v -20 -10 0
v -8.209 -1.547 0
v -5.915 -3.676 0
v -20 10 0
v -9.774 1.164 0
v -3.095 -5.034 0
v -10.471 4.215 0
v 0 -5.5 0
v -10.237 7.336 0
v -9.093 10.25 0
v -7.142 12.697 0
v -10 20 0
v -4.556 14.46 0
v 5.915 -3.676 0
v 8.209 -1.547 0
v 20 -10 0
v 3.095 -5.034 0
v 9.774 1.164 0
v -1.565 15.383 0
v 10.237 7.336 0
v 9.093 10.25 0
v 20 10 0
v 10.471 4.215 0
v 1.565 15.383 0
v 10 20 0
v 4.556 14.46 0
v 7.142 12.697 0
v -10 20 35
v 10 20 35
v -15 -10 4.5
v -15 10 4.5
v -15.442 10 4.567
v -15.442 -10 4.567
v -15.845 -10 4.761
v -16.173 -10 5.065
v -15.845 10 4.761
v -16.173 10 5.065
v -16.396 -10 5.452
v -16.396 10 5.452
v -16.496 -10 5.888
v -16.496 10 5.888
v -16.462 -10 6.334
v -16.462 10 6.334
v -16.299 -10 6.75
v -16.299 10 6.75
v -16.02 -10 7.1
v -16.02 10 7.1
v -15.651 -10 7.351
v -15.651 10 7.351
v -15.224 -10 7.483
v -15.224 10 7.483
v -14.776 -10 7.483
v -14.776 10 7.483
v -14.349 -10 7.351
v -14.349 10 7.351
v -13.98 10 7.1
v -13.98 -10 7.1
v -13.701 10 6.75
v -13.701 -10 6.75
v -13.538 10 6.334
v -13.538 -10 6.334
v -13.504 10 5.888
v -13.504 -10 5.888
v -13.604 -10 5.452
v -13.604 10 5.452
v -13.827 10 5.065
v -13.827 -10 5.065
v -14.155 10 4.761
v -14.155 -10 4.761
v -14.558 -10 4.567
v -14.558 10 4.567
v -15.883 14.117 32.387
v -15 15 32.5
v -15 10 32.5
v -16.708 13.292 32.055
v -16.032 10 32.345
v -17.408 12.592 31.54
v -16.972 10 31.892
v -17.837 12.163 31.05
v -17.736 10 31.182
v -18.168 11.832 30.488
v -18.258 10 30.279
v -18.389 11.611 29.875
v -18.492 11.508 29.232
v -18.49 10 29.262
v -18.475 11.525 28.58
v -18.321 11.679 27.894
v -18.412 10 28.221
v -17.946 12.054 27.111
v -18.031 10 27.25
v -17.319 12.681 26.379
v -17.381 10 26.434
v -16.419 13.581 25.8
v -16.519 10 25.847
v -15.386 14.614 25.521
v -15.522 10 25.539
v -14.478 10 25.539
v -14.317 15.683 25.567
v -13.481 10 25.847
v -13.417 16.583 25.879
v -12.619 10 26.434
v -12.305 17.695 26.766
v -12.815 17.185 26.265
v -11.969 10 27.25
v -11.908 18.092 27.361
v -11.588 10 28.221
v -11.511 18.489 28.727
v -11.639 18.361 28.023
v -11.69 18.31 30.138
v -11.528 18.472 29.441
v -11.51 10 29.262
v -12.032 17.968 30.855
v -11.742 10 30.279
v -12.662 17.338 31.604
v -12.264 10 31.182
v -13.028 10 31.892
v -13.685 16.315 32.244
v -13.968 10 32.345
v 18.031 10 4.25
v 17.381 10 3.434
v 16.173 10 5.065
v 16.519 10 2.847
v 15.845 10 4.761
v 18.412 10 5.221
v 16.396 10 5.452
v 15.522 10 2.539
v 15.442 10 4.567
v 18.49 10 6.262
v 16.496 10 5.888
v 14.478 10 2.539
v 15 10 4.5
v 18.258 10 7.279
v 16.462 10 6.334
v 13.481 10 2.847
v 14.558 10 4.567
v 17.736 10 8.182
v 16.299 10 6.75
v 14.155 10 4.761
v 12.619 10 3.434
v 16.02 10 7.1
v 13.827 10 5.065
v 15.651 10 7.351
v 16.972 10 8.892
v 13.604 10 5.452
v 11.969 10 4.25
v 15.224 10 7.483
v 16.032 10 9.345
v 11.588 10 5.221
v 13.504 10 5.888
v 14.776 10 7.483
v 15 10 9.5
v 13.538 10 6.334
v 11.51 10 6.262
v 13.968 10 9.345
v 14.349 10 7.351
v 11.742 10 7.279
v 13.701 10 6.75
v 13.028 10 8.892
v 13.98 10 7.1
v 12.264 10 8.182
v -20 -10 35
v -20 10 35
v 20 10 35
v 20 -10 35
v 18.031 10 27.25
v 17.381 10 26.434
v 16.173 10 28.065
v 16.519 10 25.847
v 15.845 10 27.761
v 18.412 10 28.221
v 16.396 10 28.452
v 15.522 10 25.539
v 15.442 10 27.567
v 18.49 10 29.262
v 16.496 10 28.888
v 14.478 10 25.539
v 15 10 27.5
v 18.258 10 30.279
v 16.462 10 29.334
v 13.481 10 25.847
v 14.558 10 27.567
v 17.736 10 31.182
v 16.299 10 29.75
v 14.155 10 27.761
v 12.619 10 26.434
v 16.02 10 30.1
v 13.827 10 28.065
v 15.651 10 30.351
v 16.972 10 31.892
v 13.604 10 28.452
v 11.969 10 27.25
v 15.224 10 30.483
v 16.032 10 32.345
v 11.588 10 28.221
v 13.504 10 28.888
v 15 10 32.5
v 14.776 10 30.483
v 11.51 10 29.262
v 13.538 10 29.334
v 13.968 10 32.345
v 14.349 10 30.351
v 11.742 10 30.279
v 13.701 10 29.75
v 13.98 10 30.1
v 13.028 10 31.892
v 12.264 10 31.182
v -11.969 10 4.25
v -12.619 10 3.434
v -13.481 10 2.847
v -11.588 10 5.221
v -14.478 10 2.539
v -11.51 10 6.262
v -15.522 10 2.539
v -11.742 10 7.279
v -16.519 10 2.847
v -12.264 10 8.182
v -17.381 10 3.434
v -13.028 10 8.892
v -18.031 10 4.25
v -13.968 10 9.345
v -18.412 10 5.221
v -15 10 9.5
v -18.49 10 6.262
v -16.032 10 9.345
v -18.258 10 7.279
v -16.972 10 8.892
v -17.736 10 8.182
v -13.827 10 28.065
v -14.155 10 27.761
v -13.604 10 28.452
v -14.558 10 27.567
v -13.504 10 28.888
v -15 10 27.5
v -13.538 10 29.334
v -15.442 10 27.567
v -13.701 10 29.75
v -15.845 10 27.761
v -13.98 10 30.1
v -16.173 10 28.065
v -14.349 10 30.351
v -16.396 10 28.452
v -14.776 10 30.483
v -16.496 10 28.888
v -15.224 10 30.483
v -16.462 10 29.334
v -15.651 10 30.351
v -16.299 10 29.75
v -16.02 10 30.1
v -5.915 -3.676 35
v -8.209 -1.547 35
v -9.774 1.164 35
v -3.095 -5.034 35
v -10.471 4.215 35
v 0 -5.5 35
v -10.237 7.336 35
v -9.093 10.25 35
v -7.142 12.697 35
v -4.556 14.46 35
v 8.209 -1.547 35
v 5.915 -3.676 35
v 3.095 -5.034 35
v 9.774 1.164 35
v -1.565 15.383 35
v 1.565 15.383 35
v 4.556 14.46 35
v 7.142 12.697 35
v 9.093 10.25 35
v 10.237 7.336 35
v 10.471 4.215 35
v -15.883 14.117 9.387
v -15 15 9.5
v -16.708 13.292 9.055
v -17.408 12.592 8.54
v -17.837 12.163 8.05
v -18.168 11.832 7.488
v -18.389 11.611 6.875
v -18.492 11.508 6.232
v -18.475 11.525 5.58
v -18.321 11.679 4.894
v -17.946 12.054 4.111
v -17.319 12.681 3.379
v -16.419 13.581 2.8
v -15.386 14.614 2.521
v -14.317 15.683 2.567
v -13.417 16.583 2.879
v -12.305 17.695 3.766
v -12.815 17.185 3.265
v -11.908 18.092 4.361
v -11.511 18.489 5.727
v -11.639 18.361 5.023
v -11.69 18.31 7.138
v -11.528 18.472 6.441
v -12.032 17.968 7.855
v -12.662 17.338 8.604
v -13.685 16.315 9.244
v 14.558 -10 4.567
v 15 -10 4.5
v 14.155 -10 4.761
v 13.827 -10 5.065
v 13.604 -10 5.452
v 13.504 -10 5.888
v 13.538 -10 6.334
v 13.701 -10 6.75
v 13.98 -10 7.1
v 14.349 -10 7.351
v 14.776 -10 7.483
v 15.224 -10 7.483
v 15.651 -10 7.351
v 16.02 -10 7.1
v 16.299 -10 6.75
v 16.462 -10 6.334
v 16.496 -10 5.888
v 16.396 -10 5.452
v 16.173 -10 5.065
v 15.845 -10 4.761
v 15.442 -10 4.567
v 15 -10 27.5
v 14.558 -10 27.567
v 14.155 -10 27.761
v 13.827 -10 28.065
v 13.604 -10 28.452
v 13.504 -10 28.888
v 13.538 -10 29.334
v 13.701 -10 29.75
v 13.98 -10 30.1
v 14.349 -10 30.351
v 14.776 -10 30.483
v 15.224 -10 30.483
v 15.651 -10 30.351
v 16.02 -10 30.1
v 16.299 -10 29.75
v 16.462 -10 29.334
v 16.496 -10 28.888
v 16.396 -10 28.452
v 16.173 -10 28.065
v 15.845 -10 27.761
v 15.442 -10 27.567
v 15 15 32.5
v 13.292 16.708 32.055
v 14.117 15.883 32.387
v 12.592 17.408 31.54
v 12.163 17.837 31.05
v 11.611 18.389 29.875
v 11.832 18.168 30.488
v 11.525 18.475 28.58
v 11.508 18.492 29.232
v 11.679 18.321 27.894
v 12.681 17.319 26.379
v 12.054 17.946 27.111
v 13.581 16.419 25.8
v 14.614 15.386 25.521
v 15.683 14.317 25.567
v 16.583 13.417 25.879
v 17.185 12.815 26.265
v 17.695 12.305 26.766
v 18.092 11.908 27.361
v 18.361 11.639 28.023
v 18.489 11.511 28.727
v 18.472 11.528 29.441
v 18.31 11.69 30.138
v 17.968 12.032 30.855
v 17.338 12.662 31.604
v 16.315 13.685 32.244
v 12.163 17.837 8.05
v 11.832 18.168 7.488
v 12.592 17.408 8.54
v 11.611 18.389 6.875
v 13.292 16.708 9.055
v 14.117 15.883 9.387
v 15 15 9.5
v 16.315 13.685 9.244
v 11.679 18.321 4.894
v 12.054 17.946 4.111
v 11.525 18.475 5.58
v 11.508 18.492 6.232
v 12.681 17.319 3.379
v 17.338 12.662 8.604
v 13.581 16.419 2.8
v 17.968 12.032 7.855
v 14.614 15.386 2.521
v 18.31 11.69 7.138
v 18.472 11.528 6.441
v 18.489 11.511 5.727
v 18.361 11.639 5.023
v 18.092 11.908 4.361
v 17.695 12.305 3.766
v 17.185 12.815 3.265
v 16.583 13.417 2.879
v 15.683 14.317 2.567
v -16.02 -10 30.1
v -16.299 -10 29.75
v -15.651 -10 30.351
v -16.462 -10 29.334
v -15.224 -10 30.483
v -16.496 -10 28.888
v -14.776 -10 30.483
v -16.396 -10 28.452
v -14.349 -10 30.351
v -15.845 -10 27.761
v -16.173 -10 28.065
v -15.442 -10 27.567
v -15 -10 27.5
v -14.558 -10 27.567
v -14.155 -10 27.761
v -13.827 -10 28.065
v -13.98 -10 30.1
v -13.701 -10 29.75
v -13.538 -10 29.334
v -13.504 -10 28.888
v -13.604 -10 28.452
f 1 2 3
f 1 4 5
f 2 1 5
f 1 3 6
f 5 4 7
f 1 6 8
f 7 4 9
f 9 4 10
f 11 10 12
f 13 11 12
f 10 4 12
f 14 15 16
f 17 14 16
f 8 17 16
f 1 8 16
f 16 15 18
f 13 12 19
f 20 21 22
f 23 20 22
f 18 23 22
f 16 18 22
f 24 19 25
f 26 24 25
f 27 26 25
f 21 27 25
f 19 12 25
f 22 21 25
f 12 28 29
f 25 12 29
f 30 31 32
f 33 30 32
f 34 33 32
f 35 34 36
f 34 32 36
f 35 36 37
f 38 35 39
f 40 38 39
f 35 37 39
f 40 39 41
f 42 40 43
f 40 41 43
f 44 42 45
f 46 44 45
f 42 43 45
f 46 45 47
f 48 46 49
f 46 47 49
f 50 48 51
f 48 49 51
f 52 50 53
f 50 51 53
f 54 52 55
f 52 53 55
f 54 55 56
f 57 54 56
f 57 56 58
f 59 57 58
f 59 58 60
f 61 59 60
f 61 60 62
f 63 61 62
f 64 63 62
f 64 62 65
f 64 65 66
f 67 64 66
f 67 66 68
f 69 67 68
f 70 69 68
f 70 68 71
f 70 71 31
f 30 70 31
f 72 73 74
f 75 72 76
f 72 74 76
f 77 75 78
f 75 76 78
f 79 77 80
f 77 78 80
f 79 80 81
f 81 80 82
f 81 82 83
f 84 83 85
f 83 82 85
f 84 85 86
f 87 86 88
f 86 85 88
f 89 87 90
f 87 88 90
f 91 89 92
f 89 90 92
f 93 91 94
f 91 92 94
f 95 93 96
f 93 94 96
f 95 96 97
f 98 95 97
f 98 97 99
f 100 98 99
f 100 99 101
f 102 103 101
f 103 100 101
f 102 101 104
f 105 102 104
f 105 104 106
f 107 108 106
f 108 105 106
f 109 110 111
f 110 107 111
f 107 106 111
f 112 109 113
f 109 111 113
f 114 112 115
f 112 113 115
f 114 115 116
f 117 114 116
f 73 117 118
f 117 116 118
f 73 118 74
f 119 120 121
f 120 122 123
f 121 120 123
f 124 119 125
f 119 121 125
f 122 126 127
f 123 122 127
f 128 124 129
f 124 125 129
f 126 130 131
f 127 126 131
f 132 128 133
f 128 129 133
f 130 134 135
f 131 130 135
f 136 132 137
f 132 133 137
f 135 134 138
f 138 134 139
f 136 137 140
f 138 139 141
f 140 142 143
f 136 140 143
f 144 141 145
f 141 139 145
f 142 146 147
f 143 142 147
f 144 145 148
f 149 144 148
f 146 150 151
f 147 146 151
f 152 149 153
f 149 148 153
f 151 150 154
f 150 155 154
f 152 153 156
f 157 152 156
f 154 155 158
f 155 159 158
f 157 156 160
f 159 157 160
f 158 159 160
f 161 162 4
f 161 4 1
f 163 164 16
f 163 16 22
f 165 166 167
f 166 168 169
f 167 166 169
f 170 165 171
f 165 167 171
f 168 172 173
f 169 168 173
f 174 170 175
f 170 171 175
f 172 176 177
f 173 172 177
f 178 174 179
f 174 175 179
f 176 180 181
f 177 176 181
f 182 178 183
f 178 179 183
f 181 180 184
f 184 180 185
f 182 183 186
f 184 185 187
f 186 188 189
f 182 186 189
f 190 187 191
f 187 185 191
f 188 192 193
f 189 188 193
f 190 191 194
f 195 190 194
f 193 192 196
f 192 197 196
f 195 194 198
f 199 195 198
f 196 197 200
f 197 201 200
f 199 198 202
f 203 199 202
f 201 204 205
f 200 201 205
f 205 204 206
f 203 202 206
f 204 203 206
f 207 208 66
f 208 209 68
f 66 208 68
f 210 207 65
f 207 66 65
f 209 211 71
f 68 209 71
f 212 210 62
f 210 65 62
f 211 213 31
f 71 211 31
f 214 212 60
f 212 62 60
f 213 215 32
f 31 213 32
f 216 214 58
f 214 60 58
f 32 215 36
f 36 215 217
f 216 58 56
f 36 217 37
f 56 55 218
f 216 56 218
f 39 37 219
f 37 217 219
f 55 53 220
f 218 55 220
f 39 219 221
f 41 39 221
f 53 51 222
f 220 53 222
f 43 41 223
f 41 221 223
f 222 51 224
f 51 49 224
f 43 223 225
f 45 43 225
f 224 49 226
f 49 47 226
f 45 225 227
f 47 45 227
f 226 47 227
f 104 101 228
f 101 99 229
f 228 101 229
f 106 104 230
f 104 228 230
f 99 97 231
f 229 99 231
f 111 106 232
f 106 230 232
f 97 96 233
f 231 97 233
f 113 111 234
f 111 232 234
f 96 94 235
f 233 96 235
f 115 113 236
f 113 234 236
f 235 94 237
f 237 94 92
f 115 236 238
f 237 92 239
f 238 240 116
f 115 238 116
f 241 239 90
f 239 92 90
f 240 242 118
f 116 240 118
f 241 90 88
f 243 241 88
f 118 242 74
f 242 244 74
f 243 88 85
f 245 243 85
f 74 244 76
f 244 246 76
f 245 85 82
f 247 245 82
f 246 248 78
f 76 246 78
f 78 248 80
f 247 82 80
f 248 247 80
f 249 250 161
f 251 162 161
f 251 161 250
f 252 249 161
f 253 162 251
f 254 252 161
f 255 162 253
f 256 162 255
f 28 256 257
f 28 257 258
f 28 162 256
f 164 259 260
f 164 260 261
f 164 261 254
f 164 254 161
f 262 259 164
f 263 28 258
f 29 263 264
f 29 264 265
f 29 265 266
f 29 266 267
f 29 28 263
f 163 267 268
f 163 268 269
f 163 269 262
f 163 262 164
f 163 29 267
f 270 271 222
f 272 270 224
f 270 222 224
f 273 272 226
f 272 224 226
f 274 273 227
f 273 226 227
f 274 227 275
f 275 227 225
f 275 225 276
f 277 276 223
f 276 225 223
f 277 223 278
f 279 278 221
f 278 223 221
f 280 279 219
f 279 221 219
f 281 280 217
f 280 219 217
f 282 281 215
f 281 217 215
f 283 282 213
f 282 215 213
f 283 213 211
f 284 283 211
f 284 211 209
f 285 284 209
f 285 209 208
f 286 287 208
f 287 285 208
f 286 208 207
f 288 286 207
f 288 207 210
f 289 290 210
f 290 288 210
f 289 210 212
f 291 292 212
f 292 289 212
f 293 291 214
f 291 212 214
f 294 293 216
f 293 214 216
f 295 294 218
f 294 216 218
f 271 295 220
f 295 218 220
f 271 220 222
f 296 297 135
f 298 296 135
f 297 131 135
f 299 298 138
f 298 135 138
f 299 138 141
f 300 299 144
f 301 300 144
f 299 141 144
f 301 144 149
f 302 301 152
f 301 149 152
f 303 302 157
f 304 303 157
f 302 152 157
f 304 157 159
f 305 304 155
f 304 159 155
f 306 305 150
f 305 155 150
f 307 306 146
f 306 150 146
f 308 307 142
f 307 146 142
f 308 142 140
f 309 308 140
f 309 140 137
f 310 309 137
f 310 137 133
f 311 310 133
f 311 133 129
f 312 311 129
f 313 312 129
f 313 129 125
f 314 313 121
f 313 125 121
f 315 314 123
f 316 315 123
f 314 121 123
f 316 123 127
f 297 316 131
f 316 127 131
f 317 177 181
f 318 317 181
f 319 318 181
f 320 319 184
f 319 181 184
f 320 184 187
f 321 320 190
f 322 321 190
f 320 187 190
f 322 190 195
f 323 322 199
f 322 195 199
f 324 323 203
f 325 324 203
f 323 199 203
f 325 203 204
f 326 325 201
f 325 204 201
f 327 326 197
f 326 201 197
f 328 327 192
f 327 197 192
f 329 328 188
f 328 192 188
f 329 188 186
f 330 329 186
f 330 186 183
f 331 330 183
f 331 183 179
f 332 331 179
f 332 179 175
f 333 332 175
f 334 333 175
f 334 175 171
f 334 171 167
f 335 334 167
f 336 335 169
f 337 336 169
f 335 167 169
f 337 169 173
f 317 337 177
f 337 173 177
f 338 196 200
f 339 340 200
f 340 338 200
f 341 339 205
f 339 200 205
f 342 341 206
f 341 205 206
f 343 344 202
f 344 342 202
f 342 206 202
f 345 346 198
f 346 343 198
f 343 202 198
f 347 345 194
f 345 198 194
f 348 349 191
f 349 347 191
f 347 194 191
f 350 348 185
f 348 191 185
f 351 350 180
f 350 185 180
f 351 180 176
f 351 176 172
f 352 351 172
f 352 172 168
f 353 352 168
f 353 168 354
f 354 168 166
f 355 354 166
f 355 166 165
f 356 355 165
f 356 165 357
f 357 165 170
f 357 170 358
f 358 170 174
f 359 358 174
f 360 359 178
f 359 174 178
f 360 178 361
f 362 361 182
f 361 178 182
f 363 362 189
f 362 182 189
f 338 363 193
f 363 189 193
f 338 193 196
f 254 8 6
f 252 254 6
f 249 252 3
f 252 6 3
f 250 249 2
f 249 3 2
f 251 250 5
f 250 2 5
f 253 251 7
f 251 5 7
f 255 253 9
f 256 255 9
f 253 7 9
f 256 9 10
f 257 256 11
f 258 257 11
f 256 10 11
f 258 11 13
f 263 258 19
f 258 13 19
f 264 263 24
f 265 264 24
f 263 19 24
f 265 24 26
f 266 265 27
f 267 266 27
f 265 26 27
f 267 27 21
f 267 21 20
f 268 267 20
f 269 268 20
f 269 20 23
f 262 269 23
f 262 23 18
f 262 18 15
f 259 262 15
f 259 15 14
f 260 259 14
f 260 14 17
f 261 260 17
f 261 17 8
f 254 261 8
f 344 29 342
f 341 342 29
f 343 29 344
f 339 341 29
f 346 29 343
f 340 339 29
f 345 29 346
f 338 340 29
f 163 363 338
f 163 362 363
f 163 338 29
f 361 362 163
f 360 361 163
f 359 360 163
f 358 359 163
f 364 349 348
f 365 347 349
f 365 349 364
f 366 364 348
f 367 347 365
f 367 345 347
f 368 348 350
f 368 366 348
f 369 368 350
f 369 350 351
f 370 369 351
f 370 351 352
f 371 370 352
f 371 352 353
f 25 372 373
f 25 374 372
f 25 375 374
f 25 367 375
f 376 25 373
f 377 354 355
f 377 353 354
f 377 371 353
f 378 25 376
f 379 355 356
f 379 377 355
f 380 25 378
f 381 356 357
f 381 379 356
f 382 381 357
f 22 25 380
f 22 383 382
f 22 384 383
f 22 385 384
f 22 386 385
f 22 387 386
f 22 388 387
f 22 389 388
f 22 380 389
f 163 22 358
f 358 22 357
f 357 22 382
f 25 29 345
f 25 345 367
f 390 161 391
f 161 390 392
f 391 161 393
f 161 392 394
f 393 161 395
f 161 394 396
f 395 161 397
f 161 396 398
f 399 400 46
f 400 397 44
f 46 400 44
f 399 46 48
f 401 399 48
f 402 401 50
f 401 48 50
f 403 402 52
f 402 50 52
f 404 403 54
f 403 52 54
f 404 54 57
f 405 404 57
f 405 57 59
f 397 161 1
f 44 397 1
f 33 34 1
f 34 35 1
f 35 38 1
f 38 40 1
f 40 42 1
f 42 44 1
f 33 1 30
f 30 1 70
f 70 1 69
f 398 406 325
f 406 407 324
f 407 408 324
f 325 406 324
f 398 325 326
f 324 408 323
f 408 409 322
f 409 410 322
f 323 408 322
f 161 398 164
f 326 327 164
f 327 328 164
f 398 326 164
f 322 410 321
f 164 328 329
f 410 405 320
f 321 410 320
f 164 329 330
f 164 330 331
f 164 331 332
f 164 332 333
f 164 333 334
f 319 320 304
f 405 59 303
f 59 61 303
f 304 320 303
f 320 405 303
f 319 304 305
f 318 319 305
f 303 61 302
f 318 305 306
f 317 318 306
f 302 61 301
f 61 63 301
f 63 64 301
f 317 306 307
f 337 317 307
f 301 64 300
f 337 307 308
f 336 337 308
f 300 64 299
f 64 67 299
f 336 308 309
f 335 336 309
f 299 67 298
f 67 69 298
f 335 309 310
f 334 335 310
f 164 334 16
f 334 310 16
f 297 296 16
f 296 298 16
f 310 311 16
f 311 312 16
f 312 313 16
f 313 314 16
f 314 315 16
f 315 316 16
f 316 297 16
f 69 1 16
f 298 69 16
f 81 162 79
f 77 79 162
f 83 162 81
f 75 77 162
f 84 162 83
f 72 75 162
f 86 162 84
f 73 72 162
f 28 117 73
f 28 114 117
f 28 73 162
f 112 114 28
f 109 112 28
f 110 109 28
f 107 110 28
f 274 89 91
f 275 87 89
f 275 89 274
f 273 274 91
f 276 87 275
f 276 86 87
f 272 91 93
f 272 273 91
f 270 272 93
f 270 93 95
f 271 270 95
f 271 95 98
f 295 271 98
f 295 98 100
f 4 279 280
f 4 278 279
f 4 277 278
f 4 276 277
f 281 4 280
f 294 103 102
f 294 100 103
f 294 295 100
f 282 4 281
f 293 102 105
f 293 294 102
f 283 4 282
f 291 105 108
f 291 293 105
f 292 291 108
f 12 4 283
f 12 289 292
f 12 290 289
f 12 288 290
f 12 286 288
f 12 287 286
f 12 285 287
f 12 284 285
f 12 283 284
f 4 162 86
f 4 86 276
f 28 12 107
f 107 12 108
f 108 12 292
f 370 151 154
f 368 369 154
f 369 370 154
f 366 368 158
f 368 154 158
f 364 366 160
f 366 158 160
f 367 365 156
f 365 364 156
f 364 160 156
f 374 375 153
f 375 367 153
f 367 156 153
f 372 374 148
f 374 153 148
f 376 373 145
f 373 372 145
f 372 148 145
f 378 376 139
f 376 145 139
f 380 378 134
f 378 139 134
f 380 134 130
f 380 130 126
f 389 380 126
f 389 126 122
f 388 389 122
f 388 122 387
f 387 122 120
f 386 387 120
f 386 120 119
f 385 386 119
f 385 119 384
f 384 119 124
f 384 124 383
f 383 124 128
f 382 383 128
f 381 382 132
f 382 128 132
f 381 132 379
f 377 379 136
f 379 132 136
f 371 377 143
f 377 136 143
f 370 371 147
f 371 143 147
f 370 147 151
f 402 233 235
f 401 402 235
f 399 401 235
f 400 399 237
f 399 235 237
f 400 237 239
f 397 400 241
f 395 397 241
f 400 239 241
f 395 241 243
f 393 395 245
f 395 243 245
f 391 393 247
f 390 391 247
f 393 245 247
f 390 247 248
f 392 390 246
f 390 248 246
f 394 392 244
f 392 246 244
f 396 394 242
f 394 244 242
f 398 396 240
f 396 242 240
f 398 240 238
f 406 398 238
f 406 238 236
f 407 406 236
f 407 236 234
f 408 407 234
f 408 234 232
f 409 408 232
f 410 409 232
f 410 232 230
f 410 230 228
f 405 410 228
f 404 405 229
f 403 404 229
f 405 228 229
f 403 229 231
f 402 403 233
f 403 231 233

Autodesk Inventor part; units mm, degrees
ref_plane "YZ Plane" through (0, 0, 0) normal (1, 0, 0) x (0, 1, 0)
ref_plane "XZ Plane" through (0, 0, 0) normal (0, 1, 0) x (-1, 0, 0)
ref_plane "XY Plane" through (0, 0, 0) normal (0, 0, 1) x (1, 0, 0)
sketch "Boceto2" plane through (0, 0, 0) normal (0, 0, 1) x (1, 0, 0)
  line L0 (-20, -10) -> (20, -10)
  line L1 (20, -10) -> (20, 10)
  line L2 (20, 10) -> (-20, 10)
  line L3 (-20, 10) -> (-20, -10)
  line L4 (-20, -10) -> (20, 10) construction
  line L5 (20, -10) -> (-20, 10) construction
  line L6 (-20, 10) -> (-10, 20)
  line L7 (10, 20) -> (20, 10)
  line L8 (-10, 20) -> (10, 20)
  point P0 (0, 0)
  dimension "d0" = 20
  dimension "d1" = 40
  dimension "d2" = 10
  dimension "d3" = 10
  dimension "d4" = 10
extrude "Extrusión1" add sketch "Boceto2" along normal blind 35
sketch "Boceto3" plane through (0, 0, 35) normal (0, 0, 1) x (1, 0, 0)
  circle A0 centre (0, 5) radius 10
  line L0 (-20, -10) -> (20, -10) projected
  point P0 (0, 0)
  dimension "d7" = 20
  dimension "d8" = 15
hole "Agujero1" at (0, 5, 35) direction (0, 0, -1) diameter 21 depth 35 tip angle 118
sketch "Boceto4" plane through (-20, -10, 0) normal (0, -1, 0) x (1, 0, 0)
  line L0 (5, 6) -> (35, 6)
  line L1 (35, 6) -> (35, 29)
  line L2 (35, 29) -> (5, 29)
  line L3 (5, 29) -> (5, 6)
  line L4 (5, 6) -> (35, 29) construction
  line L5 (35, 6) -> (5, 29) construction
  line L6 (40, 0) -> (40, 35) projected
  line L7 (30, 0) -> (30, 35) projected
  line L8 (0, 0) -> (0, 35) projected
  line L9 (0, 35) -> (40, 35) projected
  line L10 (0, 0) -> (40, 0) projected
  point P0 (20, 0)
  point P1 (20, 17.5)
  dimension "d16" = 23
  dimension "d17" = 5
  dimension "d18" = 10
  dimension "d19" = 5
  dimension "d20" = 30
  dimension "d30" = 17.5
  dimension "d31" = 35
hole "Agujero2" at (-15, -10, 29) at (15, -10, 29) at (15, -10, 6) at (-15, -10, 6) direction (0, 1, 0) diameter 3 depth 35 tip angle 118
sketch "Boceto6" plane through (-10, 20, 0) normal (0, 1, 0) x (1, 0, 0)
  line L0 (-5, -29) -> (25, -29)
  line L1 (25, -29) -> (25, -6)
  line L2 (25, -6) -> (-5, -6)
  line L3 (-5, -6) -> (-5, -29)
  line L4 (-5, -29) -> (25, -6) construction
  line L5 (25, -29) -> (-5, -6) construction
  line L6 (20, 0) -> (0, 0) projected
  point P0 (10, 0)
  point P1 (10, -17.5)
  dimension "d32" = 17.5
  dimension "d33" = 30
  dimension "d34" = 23
hole "Agujero3" at (15, 20, 29) at (-15, 20, 29) at (-15, 20, 6) at (15, 20, 6) direction (0, -1, 0) diameter 7 depth 10
properties part number "BracketLineal" material "Plástico ABS"
